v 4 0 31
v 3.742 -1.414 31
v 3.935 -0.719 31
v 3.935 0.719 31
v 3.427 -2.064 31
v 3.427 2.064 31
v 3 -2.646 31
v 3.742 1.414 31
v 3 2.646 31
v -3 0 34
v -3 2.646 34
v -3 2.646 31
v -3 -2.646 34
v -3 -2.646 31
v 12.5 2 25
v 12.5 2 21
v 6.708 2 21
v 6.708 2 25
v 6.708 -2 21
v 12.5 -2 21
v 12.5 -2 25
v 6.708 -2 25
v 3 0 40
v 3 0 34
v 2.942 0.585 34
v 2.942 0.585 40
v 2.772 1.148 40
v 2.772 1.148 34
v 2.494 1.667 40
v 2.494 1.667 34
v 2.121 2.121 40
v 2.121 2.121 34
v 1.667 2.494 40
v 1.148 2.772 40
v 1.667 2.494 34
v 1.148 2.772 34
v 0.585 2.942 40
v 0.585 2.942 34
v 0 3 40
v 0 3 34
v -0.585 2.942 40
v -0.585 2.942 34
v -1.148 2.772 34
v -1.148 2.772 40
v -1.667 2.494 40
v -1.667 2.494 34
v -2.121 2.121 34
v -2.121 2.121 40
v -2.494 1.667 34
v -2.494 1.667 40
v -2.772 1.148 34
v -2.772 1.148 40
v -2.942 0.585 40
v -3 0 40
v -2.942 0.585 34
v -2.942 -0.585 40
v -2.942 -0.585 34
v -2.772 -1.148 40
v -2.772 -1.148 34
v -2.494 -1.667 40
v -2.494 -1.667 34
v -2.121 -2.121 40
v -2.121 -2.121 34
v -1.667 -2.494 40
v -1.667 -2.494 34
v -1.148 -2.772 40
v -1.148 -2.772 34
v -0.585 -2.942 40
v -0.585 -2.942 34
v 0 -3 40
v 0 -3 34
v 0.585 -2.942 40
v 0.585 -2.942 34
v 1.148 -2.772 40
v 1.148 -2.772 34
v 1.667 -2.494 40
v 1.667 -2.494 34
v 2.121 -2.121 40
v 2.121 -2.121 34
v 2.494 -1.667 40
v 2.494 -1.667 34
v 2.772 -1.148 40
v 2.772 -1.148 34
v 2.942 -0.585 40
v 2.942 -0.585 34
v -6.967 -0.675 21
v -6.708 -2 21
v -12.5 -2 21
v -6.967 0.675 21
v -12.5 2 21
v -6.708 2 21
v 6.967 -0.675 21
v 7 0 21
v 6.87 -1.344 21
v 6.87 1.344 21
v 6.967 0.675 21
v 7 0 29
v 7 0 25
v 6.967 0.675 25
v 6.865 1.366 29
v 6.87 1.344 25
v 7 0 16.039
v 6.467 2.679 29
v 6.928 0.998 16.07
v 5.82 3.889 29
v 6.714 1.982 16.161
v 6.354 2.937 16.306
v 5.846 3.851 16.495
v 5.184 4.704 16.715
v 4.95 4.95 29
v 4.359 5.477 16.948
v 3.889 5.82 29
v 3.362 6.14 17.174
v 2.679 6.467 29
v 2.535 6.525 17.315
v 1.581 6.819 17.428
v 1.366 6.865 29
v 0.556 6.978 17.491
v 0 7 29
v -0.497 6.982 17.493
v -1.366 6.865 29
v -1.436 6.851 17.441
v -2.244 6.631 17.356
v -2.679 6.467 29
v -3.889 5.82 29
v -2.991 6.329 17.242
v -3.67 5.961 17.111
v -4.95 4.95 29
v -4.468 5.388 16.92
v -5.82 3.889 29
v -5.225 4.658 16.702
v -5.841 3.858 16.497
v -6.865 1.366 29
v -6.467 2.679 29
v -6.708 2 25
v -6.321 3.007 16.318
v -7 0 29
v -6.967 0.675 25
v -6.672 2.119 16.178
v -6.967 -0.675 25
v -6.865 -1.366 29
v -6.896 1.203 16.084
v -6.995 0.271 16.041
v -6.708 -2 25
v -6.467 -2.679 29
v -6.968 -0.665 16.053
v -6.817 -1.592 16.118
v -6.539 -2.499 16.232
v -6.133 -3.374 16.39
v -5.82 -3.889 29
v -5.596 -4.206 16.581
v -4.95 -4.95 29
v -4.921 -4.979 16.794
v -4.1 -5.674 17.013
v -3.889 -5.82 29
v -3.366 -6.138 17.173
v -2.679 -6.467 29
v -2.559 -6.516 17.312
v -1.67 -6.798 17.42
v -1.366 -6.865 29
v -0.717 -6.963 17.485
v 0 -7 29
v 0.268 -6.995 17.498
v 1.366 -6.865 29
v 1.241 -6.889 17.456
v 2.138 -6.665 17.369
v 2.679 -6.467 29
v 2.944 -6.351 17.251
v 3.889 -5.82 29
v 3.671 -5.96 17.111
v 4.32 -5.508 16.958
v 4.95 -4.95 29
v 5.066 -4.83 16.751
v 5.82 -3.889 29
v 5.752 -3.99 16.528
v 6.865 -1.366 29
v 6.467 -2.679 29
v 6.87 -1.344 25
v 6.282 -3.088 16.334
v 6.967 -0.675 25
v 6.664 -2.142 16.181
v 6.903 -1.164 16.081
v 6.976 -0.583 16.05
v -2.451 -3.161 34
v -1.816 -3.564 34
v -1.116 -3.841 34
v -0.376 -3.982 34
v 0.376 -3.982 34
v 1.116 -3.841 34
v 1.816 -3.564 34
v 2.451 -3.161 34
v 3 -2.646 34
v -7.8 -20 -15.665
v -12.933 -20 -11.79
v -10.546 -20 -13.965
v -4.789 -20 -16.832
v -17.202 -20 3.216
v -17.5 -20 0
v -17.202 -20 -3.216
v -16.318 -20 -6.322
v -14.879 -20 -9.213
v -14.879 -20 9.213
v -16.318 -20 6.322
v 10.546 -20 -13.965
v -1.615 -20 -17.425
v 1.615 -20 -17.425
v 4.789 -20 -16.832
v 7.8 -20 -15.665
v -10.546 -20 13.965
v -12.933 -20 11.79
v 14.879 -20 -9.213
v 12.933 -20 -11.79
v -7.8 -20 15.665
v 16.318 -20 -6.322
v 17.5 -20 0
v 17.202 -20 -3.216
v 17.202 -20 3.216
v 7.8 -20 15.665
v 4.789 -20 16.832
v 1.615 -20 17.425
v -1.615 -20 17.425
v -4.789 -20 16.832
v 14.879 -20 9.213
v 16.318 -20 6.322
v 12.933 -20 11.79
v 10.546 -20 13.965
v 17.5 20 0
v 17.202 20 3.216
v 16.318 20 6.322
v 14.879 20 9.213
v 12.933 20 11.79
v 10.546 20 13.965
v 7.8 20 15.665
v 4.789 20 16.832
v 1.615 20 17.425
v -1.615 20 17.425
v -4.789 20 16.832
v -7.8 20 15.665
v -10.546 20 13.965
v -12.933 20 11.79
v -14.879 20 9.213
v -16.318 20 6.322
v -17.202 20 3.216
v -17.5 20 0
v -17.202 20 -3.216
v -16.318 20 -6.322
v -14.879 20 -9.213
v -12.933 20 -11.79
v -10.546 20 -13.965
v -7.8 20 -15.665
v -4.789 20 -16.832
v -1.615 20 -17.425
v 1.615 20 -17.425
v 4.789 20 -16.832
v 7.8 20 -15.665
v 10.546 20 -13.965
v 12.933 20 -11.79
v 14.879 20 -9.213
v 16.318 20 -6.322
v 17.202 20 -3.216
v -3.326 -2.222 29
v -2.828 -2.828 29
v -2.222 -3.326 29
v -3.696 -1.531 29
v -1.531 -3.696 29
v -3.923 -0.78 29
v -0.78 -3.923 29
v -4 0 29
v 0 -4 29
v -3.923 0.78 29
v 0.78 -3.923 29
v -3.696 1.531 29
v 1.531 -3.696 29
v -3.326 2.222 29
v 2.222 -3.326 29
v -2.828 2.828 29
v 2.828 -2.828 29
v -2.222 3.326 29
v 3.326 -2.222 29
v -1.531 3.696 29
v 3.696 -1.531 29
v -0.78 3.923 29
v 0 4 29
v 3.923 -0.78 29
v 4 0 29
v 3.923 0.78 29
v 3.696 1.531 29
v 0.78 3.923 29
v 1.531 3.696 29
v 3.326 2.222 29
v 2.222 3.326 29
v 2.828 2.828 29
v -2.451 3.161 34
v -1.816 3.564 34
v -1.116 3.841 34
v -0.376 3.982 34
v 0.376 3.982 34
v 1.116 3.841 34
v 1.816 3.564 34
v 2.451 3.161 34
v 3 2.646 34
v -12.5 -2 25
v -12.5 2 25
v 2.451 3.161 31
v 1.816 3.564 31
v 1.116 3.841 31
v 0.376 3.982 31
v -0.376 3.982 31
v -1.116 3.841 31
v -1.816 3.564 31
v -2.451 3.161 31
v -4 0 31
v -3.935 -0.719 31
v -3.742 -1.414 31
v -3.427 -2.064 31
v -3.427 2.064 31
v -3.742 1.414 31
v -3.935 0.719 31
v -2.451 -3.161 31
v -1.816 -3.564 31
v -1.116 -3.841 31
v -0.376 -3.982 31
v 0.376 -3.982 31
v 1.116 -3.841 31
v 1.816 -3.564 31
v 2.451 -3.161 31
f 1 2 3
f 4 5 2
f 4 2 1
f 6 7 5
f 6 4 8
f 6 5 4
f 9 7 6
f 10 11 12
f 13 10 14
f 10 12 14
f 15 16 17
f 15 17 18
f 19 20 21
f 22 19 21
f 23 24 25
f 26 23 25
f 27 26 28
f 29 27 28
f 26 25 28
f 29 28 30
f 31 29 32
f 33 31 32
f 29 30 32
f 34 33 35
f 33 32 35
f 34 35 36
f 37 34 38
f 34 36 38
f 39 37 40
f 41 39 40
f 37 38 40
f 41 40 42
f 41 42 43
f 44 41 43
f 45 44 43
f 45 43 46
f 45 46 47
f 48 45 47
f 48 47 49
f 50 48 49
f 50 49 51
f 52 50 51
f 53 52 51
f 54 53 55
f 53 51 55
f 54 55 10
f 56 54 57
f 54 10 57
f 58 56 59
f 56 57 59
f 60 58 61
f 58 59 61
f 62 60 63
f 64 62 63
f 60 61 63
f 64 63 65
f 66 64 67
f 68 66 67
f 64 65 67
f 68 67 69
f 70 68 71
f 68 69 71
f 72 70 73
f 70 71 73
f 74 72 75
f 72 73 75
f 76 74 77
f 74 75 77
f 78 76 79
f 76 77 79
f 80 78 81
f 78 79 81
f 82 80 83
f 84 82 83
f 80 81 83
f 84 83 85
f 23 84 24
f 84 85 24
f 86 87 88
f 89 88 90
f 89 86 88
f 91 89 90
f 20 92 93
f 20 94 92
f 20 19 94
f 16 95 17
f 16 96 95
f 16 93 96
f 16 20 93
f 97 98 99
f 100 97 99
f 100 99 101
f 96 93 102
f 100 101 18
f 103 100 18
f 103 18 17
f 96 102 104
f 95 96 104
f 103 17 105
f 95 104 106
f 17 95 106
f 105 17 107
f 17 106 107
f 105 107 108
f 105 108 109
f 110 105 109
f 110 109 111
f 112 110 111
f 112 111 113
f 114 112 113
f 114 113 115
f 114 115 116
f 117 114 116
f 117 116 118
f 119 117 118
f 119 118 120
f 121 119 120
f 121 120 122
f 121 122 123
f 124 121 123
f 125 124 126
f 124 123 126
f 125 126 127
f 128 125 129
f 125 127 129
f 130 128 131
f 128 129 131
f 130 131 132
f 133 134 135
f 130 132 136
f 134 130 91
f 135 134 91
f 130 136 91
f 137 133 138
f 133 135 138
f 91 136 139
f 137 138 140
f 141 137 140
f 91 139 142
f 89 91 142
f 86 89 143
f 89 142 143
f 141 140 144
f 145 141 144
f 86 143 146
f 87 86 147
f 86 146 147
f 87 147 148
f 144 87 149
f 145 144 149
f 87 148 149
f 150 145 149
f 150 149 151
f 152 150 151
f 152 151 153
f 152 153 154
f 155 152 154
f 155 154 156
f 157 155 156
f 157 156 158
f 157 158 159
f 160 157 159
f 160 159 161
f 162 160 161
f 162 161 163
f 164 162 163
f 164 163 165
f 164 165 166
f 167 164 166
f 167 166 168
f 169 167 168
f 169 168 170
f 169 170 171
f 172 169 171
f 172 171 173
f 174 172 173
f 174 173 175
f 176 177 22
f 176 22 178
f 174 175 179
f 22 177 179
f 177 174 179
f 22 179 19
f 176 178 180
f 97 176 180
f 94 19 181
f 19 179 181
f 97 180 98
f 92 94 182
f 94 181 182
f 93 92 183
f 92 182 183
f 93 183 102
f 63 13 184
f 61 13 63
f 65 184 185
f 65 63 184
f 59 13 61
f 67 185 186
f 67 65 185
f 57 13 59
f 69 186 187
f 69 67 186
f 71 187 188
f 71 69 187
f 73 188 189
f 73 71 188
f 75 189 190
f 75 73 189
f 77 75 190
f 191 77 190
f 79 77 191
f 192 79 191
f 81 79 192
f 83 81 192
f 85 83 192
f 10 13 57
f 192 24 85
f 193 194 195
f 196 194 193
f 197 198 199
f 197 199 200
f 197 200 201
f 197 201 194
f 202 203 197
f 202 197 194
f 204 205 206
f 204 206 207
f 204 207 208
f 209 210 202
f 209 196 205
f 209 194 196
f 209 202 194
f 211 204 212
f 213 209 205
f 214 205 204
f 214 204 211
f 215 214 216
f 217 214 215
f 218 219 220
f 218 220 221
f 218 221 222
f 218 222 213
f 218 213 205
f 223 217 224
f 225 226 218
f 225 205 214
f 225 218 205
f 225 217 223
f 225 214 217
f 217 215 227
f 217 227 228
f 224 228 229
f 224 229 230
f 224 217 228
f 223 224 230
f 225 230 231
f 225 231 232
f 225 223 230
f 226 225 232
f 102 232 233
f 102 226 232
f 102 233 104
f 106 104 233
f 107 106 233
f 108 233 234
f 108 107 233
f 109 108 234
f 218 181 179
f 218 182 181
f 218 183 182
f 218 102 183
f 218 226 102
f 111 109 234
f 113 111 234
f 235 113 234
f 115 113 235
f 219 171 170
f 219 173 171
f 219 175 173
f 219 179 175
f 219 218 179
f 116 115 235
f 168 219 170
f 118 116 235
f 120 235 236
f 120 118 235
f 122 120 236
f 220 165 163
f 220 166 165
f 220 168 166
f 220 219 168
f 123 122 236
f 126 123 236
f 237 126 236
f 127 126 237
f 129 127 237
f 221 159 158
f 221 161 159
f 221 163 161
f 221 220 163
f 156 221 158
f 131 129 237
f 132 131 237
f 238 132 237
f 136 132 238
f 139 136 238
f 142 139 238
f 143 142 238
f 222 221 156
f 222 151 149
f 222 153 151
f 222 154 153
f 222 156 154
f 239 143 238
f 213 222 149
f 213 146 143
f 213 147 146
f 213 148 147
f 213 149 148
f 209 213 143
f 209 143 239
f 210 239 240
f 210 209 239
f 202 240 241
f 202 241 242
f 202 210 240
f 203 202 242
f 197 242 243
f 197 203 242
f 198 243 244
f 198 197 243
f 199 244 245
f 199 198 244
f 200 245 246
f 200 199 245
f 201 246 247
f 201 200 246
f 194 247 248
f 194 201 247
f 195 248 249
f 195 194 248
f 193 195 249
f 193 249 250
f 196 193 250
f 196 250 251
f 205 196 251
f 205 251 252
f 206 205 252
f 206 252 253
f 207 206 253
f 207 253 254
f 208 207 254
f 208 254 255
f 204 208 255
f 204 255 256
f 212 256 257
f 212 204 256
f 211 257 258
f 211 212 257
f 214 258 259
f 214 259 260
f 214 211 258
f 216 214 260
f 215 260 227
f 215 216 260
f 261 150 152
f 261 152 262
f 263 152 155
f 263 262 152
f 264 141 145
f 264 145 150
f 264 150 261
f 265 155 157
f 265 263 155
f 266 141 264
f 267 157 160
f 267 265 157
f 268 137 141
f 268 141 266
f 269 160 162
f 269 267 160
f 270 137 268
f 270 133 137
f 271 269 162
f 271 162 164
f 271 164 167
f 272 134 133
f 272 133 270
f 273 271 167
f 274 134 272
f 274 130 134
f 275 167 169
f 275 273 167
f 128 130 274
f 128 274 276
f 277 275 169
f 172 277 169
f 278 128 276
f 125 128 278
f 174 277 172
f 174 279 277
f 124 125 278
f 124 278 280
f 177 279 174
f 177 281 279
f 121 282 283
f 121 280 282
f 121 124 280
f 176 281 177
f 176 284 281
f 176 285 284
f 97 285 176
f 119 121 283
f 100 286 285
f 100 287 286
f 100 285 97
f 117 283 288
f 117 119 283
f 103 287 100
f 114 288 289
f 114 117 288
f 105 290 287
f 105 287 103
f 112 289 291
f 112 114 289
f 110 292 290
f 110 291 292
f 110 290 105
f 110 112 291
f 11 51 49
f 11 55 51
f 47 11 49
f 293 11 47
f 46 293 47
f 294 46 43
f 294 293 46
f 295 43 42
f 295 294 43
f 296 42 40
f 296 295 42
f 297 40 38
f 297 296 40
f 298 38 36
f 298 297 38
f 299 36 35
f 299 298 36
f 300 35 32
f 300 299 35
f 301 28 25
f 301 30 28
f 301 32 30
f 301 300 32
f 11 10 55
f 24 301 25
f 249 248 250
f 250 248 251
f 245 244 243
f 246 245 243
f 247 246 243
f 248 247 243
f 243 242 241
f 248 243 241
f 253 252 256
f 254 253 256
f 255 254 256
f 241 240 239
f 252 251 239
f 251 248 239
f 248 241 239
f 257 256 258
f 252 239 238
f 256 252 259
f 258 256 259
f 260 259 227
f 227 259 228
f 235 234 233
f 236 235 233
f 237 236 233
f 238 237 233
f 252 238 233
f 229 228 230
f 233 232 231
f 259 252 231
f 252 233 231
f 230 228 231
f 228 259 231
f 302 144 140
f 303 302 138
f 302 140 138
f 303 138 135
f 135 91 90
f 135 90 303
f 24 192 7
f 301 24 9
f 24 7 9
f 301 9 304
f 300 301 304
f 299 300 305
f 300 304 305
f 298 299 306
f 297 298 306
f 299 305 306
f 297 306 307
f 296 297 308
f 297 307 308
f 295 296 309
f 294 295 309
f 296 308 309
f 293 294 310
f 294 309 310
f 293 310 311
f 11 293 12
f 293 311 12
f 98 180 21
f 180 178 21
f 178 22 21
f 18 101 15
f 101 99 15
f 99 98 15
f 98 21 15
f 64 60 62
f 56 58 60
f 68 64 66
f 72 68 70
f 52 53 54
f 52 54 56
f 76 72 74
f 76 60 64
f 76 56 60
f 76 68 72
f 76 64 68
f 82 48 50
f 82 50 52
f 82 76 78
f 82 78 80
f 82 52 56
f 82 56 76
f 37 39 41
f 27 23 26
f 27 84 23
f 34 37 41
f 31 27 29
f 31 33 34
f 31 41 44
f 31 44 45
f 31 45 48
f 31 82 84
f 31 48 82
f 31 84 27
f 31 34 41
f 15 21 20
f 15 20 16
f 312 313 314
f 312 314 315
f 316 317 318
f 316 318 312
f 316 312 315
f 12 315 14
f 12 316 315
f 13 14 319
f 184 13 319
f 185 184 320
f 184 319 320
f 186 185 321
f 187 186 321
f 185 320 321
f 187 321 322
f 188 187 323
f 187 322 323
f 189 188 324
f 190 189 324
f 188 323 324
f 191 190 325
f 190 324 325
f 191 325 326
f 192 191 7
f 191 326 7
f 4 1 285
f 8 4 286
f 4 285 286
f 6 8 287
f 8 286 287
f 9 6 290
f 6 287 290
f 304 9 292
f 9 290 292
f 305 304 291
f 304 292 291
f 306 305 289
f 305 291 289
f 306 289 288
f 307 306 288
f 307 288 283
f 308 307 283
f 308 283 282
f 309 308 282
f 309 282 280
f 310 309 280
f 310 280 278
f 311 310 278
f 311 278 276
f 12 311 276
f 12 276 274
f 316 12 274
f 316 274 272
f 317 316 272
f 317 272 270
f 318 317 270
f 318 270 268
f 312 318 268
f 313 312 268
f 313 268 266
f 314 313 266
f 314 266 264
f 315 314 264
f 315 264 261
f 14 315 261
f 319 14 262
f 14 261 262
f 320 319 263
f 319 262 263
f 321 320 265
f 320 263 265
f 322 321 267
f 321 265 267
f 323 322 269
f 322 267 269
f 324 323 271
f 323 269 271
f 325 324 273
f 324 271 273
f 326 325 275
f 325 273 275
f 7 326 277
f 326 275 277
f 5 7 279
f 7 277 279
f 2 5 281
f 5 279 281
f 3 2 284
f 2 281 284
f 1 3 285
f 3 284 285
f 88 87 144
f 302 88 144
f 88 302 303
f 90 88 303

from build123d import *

# Parameters (mm, degrees)
F0_R      = 17.5
F1_DEPTH  = 20
F2_R      = 7
F3_DEPTH  = 29
F4_R      = 4
F5_DEPTH  = 2
F7_DEPTH  = 3
F9_DEPTH  = 6
F10_W     = 4
F10_H     = 4
F11_DEPTH = 12.5


with BuildPart() as f1:
    # F0 (on Front) → F1 (new body, symmetric)
    with BuildSketch(Plane.XZ):
        Circle(F0_R)
    extrude(amount=F1_DEPTH, both=True)

    # F2 (on Top) → F3 (join)
    with BuildSketch(Plane.XY):
        Circle(F2_R)
    extrude(amount=F3_DEPTH)

    # F4 (on face) → F5 (join)
    with BuildSketch(Plane.XY.offset(29)):
        Circle(F4_R)
    extrude(amount=F5_DEPTH)

    # F6 (on face) → F7 (join)
    with BuildSketch(Plane.XY.offset(31)):
        with BuildLine():
            Line((-3, 2.6457513111), (-3, -2.6457513111))
            ThreePointArc((-3, -2.6457513111), (0, -4), (3, -2.6457513111))
            Line((3, -2.6457513111), (3, 2.6457513111))
            ThreePointArc((3, 2.6457513111), (0, 4), (-3, 2.6457513111))
        make_face()
    extrude(amount=F7_DEPTH)

    # F8 (on face) → F9 (join)
    with BuildSketch(Plane.XY.offset(34)):
        with BuildLine():
            ThreePointArc((-3, 0), (0, -3), (3, 0))
            ThreePointArc((3, 0), (0, 3), (-3, 0))
        make_face()
    extrude(amount=F9_DEPTH)

    # F10 (on Right) → F11 (join, symmetric)
    with BuildSketch(Plane.YZ):
        with Locations((0, 23)):
            Rectangle(F10_W, F10_H)
    extrude(amount=F11_DEPTH, both=True)


solid = f1.part
